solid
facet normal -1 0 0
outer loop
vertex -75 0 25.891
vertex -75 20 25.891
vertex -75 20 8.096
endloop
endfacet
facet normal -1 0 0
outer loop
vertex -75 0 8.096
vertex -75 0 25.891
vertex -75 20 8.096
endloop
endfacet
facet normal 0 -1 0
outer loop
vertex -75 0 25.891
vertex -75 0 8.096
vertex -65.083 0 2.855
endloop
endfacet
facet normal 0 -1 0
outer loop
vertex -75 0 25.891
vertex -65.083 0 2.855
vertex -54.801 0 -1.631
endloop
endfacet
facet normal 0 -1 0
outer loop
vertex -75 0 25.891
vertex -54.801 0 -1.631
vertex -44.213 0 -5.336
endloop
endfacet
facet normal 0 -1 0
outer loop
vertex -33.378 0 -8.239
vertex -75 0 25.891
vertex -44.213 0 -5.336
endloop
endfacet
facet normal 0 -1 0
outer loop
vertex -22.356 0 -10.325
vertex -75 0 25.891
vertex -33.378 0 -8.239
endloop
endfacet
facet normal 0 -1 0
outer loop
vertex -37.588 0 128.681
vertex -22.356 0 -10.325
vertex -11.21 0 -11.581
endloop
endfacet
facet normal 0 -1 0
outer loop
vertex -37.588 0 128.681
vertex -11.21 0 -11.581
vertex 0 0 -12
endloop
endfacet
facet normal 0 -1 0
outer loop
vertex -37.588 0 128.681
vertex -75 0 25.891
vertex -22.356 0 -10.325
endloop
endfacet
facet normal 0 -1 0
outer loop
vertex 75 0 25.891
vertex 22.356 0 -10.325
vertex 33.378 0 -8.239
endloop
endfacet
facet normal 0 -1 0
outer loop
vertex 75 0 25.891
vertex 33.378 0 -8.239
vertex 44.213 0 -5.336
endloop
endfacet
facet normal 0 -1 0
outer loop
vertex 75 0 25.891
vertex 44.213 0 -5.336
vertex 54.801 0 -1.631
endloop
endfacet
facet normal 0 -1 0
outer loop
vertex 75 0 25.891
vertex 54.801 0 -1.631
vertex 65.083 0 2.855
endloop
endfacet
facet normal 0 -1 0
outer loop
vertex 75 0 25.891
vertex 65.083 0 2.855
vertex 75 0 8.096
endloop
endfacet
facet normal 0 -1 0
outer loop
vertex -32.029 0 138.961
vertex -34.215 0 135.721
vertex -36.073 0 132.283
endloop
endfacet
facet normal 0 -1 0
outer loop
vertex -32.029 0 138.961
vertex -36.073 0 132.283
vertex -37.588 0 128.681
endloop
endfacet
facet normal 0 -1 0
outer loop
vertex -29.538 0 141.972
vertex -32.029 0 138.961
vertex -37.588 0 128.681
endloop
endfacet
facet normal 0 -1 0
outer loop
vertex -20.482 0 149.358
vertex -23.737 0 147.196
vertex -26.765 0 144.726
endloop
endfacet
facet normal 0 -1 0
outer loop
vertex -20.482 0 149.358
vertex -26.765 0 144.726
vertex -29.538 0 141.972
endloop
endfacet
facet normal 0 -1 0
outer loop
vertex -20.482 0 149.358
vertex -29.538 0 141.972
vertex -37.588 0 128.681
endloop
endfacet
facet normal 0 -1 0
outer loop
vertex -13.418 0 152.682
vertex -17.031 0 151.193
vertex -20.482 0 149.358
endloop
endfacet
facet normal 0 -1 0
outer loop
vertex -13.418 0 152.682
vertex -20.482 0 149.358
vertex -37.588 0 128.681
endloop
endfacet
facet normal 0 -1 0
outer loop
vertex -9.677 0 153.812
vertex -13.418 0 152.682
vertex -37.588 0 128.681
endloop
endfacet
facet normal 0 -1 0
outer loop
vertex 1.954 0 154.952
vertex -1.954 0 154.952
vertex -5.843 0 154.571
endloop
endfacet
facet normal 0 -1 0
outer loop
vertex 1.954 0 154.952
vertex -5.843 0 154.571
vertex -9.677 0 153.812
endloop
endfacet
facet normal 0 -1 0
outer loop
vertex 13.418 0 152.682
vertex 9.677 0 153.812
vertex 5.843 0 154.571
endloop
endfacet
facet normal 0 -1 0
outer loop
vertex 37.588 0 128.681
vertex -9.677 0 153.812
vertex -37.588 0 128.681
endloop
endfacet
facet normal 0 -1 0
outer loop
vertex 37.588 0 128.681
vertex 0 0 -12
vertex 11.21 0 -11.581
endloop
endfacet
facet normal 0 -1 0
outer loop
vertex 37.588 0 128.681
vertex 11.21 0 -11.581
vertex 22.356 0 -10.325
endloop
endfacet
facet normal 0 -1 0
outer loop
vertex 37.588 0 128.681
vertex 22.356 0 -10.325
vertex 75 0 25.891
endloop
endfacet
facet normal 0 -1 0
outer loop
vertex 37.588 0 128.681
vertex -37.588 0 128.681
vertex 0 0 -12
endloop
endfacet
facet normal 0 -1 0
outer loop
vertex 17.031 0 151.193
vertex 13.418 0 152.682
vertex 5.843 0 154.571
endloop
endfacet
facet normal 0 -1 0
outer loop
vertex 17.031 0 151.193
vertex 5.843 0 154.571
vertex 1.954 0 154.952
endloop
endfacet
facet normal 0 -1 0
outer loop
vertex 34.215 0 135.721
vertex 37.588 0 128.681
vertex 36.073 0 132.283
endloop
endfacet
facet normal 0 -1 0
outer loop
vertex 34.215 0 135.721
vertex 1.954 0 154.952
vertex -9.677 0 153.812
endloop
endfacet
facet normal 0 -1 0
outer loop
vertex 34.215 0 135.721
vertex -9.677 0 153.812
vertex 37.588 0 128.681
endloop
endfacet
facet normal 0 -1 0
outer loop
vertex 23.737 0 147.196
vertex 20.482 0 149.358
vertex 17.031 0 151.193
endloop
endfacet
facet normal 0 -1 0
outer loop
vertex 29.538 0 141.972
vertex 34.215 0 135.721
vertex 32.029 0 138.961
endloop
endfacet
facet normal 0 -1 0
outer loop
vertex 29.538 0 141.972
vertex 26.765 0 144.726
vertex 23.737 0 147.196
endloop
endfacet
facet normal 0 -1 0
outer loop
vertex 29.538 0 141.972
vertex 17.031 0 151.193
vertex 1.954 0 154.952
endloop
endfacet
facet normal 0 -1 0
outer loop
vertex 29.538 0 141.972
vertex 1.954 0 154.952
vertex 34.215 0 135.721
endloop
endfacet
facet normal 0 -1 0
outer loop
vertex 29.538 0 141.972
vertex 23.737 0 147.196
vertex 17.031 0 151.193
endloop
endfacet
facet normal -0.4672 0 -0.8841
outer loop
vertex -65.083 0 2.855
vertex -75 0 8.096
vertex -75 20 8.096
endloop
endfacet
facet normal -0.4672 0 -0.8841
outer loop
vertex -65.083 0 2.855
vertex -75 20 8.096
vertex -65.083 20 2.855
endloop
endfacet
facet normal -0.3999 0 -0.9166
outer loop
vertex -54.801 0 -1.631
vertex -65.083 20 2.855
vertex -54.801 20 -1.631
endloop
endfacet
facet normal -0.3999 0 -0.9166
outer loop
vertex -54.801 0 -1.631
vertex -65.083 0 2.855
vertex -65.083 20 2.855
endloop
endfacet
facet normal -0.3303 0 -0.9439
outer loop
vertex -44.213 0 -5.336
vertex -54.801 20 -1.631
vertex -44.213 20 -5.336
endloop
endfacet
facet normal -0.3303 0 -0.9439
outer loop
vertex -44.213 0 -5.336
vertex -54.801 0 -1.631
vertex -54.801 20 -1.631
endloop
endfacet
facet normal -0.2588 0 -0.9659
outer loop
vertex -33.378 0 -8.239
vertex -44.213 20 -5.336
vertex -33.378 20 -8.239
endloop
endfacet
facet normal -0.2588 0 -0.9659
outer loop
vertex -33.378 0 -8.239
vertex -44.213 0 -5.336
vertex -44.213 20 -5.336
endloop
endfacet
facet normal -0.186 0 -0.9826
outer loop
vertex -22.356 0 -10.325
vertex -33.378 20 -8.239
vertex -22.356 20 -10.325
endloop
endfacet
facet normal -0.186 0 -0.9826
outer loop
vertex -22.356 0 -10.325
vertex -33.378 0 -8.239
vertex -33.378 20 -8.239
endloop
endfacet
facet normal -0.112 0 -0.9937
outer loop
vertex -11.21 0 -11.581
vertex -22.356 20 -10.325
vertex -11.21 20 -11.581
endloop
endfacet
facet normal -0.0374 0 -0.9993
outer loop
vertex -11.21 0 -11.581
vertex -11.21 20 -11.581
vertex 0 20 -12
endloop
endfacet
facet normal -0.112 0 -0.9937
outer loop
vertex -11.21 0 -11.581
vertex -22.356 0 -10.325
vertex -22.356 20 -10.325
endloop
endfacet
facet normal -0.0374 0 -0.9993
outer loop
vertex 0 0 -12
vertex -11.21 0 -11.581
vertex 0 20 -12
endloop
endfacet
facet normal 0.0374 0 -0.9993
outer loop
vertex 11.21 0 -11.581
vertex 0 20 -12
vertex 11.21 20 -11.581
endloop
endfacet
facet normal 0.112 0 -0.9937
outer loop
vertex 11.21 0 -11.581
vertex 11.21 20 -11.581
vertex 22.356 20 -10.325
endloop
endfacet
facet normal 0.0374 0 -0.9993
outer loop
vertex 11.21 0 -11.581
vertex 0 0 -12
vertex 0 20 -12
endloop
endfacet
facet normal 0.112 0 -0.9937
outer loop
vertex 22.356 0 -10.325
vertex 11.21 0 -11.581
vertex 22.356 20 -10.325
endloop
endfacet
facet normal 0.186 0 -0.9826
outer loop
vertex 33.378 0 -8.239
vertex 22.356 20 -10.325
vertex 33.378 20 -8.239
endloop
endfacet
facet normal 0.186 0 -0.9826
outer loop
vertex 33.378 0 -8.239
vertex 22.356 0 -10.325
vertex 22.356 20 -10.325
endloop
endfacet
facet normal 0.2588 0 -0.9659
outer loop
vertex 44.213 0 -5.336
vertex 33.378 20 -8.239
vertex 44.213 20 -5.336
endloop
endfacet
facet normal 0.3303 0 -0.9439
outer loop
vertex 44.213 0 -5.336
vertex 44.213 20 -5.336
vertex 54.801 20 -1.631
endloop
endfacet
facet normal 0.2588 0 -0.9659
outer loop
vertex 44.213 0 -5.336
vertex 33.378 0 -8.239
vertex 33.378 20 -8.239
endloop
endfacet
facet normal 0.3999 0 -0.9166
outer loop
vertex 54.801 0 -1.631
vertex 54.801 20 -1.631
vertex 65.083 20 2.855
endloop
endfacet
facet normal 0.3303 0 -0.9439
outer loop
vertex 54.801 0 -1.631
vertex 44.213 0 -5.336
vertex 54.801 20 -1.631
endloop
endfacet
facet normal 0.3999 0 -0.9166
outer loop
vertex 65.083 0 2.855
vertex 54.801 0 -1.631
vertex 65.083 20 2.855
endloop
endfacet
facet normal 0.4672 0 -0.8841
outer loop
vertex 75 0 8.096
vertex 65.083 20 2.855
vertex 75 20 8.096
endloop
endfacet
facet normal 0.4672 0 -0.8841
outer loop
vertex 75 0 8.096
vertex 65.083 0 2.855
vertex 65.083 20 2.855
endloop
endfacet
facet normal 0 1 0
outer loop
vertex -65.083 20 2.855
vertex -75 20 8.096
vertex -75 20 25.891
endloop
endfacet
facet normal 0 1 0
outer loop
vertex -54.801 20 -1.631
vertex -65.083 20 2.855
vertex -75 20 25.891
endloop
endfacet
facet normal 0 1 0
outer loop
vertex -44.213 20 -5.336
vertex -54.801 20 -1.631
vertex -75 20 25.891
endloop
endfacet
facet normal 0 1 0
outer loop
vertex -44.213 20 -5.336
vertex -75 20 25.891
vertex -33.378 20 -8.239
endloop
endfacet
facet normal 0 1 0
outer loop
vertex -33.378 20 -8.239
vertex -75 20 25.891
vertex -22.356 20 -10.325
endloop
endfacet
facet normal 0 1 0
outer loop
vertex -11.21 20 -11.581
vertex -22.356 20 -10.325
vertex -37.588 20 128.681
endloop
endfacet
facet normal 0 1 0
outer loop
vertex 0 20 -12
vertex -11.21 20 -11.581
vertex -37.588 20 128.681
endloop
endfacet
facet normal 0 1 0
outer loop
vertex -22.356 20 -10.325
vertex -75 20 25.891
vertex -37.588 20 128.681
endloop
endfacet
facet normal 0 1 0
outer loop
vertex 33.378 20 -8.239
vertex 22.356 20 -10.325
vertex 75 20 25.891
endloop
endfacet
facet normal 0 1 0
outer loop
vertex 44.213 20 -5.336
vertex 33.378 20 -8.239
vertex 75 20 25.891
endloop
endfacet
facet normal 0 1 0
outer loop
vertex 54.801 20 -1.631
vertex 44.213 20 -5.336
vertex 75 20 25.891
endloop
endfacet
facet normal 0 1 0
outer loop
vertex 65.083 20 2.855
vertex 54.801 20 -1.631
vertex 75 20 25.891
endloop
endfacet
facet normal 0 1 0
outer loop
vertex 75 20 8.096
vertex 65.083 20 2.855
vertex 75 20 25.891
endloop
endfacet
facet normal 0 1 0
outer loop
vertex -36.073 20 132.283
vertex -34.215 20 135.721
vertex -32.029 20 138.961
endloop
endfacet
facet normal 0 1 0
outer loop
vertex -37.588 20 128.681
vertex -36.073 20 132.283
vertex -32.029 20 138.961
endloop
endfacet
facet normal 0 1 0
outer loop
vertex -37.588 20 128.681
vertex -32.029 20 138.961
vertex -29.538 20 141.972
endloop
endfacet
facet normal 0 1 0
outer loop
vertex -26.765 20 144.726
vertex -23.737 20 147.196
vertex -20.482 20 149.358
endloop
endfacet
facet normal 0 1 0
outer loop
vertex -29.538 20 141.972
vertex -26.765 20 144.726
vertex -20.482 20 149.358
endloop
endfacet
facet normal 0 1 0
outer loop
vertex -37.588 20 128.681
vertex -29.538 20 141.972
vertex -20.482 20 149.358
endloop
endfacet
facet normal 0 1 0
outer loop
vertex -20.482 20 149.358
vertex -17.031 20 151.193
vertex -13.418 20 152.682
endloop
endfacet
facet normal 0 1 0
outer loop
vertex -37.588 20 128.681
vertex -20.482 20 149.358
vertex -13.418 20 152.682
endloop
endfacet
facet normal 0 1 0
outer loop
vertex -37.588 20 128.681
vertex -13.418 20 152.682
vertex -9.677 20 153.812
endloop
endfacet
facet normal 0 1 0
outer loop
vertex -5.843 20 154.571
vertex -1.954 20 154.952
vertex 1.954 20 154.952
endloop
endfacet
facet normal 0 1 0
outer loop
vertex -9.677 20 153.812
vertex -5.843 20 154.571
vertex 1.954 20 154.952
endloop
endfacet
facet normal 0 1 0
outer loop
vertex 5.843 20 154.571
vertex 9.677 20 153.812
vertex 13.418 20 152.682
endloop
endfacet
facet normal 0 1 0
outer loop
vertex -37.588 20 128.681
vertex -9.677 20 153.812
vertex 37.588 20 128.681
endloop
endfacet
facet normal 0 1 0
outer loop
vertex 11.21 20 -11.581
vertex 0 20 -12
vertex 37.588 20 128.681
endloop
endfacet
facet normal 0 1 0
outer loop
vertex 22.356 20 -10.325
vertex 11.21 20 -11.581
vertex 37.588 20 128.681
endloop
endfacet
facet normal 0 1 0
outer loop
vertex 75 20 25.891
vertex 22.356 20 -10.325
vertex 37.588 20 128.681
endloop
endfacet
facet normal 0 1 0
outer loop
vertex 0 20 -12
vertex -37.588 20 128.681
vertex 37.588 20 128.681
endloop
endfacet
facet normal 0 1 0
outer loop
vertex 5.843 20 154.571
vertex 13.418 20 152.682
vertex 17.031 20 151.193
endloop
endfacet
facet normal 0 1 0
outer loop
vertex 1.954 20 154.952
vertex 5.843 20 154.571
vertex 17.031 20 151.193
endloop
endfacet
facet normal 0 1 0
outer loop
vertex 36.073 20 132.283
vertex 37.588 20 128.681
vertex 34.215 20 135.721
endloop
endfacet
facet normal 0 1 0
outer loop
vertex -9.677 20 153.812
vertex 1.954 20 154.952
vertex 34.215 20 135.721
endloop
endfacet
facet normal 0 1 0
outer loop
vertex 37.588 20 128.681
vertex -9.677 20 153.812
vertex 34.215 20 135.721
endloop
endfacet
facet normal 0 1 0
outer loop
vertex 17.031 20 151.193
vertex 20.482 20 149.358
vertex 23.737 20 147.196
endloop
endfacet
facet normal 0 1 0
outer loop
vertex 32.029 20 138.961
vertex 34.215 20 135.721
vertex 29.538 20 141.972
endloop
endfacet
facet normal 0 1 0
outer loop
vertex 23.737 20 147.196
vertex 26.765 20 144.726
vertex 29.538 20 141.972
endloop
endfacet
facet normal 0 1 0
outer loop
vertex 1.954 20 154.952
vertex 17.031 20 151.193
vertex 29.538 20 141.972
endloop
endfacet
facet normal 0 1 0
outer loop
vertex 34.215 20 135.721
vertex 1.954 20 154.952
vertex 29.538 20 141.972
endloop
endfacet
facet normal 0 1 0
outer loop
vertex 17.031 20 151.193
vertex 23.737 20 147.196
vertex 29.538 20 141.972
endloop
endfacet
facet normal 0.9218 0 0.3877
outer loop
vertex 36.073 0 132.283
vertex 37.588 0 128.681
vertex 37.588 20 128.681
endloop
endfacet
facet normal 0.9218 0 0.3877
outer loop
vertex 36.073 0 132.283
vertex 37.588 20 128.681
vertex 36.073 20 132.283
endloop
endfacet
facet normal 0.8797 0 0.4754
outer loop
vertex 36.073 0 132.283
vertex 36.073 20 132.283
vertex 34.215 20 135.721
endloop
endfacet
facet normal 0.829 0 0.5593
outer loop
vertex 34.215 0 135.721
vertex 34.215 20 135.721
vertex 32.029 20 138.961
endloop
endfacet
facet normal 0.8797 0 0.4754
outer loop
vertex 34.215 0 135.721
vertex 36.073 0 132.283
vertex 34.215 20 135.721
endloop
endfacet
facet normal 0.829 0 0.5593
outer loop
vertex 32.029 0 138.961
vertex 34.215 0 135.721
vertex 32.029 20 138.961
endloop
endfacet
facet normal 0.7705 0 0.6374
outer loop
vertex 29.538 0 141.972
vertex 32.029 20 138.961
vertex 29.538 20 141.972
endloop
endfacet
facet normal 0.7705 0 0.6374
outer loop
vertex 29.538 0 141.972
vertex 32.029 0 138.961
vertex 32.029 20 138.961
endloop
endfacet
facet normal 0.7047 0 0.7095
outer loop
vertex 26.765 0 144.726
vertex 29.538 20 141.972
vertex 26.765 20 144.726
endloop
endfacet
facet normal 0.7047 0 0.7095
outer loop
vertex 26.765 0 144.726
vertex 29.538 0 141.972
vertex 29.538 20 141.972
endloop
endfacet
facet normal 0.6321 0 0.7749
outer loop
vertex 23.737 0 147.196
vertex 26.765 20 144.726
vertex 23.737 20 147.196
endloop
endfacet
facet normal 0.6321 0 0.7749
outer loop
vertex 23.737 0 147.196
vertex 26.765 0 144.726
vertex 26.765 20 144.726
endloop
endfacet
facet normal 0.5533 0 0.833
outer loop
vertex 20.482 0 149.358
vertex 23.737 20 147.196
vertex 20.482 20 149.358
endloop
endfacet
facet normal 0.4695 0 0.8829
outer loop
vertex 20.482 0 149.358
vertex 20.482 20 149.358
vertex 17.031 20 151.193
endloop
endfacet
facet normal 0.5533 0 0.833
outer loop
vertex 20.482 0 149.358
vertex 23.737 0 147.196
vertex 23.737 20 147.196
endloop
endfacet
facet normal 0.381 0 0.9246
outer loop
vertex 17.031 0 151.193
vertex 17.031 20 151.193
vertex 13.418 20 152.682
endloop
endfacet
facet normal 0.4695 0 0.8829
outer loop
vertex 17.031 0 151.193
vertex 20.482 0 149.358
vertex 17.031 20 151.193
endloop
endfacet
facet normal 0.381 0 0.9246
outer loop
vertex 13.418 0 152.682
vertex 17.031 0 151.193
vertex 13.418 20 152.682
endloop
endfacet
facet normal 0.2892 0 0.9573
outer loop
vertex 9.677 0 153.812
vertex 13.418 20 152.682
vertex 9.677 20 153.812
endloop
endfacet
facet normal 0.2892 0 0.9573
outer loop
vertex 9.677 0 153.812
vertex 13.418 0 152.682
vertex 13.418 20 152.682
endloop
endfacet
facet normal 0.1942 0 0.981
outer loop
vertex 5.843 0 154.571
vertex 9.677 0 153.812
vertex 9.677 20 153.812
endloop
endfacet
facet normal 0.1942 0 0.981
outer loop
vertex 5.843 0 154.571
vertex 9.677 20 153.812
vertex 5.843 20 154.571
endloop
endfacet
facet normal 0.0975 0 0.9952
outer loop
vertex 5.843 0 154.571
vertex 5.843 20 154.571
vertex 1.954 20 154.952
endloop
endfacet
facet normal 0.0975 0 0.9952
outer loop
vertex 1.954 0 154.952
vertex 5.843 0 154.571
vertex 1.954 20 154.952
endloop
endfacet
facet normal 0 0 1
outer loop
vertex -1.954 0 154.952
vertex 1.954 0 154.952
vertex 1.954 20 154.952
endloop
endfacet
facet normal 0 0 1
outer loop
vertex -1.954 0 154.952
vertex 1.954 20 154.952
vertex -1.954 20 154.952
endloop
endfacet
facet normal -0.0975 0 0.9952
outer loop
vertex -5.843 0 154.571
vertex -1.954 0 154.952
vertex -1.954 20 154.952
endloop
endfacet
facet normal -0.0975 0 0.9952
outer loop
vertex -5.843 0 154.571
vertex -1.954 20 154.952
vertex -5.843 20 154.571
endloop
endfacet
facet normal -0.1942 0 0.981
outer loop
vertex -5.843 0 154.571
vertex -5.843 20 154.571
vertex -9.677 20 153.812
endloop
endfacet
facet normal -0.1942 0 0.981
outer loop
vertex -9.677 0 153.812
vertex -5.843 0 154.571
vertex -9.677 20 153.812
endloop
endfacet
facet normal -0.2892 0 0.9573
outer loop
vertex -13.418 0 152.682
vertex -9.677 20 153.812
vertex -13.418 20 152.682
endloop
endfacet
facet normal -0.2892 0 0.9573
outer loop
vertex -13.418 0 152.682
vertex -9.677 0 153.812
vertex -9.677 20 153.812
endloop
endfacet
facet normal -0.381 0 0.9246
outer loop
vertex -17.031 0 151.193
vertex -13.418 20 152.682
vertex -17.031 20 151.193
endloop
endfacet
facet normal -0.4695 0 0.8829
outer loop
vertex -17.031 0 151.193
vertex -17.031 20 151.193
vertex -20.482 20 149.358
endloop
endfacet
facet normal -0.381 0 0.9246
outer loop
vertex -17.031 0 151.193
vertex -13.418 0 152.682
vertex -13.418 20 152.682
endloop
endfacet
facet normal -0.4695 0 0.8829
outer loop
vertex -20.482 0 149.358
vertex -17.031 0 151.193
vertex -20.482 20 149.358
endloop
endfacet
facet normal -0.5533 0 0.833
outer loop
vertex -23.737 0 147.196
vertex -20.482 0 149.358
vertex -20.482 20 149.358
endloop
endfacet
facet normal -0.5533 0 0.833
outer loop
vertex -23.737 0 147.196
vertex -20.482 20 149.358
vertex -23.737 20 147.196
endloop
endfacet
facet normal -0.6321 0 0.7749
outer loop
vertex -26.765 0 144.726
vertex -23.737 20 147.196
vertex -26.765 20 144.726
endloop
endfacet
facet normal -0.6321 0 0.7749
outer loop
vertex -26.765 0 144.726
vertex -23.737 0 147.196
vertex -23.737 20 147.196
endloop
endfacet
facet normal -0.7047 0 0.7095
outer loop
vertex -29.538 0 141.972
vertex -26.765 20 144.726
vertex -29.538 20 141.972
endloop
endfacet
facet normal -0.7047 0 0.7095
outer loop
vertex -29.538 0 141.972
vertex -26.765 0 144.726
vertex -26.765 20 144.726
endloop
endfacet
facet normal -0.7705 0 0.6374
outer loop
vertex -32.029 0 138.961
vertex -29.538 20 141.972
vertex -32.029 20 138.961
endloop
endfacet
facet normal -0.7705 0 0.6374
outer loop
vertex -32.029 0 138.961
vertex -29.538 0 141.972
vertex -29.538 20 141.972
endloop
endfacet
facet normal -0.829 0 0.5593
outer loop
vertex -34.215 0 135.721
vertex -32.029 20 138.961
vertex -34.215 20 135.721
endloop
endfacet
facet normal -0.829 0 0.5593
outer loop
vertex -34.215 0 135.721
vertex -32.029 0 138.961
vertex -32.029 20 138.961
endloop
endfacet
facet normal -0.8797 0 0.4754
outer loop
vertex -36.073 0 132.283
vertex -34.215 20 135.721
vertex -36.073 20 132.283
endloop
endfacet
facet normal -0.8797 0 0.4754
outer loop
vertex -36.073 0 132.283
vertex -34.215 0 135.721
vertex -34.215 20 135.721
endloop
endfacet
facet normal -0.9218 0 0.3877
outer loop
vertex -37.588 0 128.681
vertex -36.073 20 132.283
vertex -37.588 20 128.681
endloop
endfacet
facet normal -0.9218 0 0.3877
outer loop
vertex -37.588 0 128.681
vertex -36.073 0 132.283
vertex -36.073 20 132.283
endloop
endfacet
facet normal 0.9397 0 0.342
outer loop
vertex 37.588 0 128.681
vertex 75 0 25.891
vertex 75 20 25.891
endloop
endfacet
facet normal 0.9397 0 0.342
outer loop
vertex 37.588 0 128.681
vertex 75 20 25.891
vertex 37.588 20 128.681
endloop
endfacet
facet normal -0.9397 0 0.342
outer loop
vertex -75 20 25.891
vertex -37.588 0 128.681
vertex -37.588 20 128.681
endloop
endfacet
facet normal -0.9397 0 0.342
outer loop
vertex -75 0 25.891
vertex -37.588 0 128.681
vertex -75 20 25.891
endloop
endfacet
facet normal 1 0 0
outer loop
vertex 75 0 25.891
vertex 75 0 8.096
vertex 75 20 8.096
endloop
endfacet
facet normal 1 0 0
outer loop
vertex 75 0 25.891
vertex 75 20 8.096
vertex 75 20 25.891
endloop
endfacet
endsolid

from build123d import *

# Parameters (mm, degrees)
F2_DEPTH = 20


with BuildPart() as f2:
    # F1 (on Front) → F2 (new body)
    with BuildSketch(Plane.XZ):
        with BuildLine():
            ThreePointArc((37.5877048314, 128.680805733), (0, 155), (-37.5877048314, 128.680805733))
            Line((-37.5877048314, 128.680805733), (-75, 25.8913695474))
            Line((-75, 25.8913695474), (-75, 8.0961894323))
            ThreePointArc((-75, 8.0961894323), (0, -12), (75, 8.0961894323))
            Line((75, 8.0961894323), (75, 25.8913695474))
            Line((75, 25.8913695474), (37.5877048314, 128.680805733))
        make_face()
    extrude(amount=-F2_DEPTH)


solid = f2.part
